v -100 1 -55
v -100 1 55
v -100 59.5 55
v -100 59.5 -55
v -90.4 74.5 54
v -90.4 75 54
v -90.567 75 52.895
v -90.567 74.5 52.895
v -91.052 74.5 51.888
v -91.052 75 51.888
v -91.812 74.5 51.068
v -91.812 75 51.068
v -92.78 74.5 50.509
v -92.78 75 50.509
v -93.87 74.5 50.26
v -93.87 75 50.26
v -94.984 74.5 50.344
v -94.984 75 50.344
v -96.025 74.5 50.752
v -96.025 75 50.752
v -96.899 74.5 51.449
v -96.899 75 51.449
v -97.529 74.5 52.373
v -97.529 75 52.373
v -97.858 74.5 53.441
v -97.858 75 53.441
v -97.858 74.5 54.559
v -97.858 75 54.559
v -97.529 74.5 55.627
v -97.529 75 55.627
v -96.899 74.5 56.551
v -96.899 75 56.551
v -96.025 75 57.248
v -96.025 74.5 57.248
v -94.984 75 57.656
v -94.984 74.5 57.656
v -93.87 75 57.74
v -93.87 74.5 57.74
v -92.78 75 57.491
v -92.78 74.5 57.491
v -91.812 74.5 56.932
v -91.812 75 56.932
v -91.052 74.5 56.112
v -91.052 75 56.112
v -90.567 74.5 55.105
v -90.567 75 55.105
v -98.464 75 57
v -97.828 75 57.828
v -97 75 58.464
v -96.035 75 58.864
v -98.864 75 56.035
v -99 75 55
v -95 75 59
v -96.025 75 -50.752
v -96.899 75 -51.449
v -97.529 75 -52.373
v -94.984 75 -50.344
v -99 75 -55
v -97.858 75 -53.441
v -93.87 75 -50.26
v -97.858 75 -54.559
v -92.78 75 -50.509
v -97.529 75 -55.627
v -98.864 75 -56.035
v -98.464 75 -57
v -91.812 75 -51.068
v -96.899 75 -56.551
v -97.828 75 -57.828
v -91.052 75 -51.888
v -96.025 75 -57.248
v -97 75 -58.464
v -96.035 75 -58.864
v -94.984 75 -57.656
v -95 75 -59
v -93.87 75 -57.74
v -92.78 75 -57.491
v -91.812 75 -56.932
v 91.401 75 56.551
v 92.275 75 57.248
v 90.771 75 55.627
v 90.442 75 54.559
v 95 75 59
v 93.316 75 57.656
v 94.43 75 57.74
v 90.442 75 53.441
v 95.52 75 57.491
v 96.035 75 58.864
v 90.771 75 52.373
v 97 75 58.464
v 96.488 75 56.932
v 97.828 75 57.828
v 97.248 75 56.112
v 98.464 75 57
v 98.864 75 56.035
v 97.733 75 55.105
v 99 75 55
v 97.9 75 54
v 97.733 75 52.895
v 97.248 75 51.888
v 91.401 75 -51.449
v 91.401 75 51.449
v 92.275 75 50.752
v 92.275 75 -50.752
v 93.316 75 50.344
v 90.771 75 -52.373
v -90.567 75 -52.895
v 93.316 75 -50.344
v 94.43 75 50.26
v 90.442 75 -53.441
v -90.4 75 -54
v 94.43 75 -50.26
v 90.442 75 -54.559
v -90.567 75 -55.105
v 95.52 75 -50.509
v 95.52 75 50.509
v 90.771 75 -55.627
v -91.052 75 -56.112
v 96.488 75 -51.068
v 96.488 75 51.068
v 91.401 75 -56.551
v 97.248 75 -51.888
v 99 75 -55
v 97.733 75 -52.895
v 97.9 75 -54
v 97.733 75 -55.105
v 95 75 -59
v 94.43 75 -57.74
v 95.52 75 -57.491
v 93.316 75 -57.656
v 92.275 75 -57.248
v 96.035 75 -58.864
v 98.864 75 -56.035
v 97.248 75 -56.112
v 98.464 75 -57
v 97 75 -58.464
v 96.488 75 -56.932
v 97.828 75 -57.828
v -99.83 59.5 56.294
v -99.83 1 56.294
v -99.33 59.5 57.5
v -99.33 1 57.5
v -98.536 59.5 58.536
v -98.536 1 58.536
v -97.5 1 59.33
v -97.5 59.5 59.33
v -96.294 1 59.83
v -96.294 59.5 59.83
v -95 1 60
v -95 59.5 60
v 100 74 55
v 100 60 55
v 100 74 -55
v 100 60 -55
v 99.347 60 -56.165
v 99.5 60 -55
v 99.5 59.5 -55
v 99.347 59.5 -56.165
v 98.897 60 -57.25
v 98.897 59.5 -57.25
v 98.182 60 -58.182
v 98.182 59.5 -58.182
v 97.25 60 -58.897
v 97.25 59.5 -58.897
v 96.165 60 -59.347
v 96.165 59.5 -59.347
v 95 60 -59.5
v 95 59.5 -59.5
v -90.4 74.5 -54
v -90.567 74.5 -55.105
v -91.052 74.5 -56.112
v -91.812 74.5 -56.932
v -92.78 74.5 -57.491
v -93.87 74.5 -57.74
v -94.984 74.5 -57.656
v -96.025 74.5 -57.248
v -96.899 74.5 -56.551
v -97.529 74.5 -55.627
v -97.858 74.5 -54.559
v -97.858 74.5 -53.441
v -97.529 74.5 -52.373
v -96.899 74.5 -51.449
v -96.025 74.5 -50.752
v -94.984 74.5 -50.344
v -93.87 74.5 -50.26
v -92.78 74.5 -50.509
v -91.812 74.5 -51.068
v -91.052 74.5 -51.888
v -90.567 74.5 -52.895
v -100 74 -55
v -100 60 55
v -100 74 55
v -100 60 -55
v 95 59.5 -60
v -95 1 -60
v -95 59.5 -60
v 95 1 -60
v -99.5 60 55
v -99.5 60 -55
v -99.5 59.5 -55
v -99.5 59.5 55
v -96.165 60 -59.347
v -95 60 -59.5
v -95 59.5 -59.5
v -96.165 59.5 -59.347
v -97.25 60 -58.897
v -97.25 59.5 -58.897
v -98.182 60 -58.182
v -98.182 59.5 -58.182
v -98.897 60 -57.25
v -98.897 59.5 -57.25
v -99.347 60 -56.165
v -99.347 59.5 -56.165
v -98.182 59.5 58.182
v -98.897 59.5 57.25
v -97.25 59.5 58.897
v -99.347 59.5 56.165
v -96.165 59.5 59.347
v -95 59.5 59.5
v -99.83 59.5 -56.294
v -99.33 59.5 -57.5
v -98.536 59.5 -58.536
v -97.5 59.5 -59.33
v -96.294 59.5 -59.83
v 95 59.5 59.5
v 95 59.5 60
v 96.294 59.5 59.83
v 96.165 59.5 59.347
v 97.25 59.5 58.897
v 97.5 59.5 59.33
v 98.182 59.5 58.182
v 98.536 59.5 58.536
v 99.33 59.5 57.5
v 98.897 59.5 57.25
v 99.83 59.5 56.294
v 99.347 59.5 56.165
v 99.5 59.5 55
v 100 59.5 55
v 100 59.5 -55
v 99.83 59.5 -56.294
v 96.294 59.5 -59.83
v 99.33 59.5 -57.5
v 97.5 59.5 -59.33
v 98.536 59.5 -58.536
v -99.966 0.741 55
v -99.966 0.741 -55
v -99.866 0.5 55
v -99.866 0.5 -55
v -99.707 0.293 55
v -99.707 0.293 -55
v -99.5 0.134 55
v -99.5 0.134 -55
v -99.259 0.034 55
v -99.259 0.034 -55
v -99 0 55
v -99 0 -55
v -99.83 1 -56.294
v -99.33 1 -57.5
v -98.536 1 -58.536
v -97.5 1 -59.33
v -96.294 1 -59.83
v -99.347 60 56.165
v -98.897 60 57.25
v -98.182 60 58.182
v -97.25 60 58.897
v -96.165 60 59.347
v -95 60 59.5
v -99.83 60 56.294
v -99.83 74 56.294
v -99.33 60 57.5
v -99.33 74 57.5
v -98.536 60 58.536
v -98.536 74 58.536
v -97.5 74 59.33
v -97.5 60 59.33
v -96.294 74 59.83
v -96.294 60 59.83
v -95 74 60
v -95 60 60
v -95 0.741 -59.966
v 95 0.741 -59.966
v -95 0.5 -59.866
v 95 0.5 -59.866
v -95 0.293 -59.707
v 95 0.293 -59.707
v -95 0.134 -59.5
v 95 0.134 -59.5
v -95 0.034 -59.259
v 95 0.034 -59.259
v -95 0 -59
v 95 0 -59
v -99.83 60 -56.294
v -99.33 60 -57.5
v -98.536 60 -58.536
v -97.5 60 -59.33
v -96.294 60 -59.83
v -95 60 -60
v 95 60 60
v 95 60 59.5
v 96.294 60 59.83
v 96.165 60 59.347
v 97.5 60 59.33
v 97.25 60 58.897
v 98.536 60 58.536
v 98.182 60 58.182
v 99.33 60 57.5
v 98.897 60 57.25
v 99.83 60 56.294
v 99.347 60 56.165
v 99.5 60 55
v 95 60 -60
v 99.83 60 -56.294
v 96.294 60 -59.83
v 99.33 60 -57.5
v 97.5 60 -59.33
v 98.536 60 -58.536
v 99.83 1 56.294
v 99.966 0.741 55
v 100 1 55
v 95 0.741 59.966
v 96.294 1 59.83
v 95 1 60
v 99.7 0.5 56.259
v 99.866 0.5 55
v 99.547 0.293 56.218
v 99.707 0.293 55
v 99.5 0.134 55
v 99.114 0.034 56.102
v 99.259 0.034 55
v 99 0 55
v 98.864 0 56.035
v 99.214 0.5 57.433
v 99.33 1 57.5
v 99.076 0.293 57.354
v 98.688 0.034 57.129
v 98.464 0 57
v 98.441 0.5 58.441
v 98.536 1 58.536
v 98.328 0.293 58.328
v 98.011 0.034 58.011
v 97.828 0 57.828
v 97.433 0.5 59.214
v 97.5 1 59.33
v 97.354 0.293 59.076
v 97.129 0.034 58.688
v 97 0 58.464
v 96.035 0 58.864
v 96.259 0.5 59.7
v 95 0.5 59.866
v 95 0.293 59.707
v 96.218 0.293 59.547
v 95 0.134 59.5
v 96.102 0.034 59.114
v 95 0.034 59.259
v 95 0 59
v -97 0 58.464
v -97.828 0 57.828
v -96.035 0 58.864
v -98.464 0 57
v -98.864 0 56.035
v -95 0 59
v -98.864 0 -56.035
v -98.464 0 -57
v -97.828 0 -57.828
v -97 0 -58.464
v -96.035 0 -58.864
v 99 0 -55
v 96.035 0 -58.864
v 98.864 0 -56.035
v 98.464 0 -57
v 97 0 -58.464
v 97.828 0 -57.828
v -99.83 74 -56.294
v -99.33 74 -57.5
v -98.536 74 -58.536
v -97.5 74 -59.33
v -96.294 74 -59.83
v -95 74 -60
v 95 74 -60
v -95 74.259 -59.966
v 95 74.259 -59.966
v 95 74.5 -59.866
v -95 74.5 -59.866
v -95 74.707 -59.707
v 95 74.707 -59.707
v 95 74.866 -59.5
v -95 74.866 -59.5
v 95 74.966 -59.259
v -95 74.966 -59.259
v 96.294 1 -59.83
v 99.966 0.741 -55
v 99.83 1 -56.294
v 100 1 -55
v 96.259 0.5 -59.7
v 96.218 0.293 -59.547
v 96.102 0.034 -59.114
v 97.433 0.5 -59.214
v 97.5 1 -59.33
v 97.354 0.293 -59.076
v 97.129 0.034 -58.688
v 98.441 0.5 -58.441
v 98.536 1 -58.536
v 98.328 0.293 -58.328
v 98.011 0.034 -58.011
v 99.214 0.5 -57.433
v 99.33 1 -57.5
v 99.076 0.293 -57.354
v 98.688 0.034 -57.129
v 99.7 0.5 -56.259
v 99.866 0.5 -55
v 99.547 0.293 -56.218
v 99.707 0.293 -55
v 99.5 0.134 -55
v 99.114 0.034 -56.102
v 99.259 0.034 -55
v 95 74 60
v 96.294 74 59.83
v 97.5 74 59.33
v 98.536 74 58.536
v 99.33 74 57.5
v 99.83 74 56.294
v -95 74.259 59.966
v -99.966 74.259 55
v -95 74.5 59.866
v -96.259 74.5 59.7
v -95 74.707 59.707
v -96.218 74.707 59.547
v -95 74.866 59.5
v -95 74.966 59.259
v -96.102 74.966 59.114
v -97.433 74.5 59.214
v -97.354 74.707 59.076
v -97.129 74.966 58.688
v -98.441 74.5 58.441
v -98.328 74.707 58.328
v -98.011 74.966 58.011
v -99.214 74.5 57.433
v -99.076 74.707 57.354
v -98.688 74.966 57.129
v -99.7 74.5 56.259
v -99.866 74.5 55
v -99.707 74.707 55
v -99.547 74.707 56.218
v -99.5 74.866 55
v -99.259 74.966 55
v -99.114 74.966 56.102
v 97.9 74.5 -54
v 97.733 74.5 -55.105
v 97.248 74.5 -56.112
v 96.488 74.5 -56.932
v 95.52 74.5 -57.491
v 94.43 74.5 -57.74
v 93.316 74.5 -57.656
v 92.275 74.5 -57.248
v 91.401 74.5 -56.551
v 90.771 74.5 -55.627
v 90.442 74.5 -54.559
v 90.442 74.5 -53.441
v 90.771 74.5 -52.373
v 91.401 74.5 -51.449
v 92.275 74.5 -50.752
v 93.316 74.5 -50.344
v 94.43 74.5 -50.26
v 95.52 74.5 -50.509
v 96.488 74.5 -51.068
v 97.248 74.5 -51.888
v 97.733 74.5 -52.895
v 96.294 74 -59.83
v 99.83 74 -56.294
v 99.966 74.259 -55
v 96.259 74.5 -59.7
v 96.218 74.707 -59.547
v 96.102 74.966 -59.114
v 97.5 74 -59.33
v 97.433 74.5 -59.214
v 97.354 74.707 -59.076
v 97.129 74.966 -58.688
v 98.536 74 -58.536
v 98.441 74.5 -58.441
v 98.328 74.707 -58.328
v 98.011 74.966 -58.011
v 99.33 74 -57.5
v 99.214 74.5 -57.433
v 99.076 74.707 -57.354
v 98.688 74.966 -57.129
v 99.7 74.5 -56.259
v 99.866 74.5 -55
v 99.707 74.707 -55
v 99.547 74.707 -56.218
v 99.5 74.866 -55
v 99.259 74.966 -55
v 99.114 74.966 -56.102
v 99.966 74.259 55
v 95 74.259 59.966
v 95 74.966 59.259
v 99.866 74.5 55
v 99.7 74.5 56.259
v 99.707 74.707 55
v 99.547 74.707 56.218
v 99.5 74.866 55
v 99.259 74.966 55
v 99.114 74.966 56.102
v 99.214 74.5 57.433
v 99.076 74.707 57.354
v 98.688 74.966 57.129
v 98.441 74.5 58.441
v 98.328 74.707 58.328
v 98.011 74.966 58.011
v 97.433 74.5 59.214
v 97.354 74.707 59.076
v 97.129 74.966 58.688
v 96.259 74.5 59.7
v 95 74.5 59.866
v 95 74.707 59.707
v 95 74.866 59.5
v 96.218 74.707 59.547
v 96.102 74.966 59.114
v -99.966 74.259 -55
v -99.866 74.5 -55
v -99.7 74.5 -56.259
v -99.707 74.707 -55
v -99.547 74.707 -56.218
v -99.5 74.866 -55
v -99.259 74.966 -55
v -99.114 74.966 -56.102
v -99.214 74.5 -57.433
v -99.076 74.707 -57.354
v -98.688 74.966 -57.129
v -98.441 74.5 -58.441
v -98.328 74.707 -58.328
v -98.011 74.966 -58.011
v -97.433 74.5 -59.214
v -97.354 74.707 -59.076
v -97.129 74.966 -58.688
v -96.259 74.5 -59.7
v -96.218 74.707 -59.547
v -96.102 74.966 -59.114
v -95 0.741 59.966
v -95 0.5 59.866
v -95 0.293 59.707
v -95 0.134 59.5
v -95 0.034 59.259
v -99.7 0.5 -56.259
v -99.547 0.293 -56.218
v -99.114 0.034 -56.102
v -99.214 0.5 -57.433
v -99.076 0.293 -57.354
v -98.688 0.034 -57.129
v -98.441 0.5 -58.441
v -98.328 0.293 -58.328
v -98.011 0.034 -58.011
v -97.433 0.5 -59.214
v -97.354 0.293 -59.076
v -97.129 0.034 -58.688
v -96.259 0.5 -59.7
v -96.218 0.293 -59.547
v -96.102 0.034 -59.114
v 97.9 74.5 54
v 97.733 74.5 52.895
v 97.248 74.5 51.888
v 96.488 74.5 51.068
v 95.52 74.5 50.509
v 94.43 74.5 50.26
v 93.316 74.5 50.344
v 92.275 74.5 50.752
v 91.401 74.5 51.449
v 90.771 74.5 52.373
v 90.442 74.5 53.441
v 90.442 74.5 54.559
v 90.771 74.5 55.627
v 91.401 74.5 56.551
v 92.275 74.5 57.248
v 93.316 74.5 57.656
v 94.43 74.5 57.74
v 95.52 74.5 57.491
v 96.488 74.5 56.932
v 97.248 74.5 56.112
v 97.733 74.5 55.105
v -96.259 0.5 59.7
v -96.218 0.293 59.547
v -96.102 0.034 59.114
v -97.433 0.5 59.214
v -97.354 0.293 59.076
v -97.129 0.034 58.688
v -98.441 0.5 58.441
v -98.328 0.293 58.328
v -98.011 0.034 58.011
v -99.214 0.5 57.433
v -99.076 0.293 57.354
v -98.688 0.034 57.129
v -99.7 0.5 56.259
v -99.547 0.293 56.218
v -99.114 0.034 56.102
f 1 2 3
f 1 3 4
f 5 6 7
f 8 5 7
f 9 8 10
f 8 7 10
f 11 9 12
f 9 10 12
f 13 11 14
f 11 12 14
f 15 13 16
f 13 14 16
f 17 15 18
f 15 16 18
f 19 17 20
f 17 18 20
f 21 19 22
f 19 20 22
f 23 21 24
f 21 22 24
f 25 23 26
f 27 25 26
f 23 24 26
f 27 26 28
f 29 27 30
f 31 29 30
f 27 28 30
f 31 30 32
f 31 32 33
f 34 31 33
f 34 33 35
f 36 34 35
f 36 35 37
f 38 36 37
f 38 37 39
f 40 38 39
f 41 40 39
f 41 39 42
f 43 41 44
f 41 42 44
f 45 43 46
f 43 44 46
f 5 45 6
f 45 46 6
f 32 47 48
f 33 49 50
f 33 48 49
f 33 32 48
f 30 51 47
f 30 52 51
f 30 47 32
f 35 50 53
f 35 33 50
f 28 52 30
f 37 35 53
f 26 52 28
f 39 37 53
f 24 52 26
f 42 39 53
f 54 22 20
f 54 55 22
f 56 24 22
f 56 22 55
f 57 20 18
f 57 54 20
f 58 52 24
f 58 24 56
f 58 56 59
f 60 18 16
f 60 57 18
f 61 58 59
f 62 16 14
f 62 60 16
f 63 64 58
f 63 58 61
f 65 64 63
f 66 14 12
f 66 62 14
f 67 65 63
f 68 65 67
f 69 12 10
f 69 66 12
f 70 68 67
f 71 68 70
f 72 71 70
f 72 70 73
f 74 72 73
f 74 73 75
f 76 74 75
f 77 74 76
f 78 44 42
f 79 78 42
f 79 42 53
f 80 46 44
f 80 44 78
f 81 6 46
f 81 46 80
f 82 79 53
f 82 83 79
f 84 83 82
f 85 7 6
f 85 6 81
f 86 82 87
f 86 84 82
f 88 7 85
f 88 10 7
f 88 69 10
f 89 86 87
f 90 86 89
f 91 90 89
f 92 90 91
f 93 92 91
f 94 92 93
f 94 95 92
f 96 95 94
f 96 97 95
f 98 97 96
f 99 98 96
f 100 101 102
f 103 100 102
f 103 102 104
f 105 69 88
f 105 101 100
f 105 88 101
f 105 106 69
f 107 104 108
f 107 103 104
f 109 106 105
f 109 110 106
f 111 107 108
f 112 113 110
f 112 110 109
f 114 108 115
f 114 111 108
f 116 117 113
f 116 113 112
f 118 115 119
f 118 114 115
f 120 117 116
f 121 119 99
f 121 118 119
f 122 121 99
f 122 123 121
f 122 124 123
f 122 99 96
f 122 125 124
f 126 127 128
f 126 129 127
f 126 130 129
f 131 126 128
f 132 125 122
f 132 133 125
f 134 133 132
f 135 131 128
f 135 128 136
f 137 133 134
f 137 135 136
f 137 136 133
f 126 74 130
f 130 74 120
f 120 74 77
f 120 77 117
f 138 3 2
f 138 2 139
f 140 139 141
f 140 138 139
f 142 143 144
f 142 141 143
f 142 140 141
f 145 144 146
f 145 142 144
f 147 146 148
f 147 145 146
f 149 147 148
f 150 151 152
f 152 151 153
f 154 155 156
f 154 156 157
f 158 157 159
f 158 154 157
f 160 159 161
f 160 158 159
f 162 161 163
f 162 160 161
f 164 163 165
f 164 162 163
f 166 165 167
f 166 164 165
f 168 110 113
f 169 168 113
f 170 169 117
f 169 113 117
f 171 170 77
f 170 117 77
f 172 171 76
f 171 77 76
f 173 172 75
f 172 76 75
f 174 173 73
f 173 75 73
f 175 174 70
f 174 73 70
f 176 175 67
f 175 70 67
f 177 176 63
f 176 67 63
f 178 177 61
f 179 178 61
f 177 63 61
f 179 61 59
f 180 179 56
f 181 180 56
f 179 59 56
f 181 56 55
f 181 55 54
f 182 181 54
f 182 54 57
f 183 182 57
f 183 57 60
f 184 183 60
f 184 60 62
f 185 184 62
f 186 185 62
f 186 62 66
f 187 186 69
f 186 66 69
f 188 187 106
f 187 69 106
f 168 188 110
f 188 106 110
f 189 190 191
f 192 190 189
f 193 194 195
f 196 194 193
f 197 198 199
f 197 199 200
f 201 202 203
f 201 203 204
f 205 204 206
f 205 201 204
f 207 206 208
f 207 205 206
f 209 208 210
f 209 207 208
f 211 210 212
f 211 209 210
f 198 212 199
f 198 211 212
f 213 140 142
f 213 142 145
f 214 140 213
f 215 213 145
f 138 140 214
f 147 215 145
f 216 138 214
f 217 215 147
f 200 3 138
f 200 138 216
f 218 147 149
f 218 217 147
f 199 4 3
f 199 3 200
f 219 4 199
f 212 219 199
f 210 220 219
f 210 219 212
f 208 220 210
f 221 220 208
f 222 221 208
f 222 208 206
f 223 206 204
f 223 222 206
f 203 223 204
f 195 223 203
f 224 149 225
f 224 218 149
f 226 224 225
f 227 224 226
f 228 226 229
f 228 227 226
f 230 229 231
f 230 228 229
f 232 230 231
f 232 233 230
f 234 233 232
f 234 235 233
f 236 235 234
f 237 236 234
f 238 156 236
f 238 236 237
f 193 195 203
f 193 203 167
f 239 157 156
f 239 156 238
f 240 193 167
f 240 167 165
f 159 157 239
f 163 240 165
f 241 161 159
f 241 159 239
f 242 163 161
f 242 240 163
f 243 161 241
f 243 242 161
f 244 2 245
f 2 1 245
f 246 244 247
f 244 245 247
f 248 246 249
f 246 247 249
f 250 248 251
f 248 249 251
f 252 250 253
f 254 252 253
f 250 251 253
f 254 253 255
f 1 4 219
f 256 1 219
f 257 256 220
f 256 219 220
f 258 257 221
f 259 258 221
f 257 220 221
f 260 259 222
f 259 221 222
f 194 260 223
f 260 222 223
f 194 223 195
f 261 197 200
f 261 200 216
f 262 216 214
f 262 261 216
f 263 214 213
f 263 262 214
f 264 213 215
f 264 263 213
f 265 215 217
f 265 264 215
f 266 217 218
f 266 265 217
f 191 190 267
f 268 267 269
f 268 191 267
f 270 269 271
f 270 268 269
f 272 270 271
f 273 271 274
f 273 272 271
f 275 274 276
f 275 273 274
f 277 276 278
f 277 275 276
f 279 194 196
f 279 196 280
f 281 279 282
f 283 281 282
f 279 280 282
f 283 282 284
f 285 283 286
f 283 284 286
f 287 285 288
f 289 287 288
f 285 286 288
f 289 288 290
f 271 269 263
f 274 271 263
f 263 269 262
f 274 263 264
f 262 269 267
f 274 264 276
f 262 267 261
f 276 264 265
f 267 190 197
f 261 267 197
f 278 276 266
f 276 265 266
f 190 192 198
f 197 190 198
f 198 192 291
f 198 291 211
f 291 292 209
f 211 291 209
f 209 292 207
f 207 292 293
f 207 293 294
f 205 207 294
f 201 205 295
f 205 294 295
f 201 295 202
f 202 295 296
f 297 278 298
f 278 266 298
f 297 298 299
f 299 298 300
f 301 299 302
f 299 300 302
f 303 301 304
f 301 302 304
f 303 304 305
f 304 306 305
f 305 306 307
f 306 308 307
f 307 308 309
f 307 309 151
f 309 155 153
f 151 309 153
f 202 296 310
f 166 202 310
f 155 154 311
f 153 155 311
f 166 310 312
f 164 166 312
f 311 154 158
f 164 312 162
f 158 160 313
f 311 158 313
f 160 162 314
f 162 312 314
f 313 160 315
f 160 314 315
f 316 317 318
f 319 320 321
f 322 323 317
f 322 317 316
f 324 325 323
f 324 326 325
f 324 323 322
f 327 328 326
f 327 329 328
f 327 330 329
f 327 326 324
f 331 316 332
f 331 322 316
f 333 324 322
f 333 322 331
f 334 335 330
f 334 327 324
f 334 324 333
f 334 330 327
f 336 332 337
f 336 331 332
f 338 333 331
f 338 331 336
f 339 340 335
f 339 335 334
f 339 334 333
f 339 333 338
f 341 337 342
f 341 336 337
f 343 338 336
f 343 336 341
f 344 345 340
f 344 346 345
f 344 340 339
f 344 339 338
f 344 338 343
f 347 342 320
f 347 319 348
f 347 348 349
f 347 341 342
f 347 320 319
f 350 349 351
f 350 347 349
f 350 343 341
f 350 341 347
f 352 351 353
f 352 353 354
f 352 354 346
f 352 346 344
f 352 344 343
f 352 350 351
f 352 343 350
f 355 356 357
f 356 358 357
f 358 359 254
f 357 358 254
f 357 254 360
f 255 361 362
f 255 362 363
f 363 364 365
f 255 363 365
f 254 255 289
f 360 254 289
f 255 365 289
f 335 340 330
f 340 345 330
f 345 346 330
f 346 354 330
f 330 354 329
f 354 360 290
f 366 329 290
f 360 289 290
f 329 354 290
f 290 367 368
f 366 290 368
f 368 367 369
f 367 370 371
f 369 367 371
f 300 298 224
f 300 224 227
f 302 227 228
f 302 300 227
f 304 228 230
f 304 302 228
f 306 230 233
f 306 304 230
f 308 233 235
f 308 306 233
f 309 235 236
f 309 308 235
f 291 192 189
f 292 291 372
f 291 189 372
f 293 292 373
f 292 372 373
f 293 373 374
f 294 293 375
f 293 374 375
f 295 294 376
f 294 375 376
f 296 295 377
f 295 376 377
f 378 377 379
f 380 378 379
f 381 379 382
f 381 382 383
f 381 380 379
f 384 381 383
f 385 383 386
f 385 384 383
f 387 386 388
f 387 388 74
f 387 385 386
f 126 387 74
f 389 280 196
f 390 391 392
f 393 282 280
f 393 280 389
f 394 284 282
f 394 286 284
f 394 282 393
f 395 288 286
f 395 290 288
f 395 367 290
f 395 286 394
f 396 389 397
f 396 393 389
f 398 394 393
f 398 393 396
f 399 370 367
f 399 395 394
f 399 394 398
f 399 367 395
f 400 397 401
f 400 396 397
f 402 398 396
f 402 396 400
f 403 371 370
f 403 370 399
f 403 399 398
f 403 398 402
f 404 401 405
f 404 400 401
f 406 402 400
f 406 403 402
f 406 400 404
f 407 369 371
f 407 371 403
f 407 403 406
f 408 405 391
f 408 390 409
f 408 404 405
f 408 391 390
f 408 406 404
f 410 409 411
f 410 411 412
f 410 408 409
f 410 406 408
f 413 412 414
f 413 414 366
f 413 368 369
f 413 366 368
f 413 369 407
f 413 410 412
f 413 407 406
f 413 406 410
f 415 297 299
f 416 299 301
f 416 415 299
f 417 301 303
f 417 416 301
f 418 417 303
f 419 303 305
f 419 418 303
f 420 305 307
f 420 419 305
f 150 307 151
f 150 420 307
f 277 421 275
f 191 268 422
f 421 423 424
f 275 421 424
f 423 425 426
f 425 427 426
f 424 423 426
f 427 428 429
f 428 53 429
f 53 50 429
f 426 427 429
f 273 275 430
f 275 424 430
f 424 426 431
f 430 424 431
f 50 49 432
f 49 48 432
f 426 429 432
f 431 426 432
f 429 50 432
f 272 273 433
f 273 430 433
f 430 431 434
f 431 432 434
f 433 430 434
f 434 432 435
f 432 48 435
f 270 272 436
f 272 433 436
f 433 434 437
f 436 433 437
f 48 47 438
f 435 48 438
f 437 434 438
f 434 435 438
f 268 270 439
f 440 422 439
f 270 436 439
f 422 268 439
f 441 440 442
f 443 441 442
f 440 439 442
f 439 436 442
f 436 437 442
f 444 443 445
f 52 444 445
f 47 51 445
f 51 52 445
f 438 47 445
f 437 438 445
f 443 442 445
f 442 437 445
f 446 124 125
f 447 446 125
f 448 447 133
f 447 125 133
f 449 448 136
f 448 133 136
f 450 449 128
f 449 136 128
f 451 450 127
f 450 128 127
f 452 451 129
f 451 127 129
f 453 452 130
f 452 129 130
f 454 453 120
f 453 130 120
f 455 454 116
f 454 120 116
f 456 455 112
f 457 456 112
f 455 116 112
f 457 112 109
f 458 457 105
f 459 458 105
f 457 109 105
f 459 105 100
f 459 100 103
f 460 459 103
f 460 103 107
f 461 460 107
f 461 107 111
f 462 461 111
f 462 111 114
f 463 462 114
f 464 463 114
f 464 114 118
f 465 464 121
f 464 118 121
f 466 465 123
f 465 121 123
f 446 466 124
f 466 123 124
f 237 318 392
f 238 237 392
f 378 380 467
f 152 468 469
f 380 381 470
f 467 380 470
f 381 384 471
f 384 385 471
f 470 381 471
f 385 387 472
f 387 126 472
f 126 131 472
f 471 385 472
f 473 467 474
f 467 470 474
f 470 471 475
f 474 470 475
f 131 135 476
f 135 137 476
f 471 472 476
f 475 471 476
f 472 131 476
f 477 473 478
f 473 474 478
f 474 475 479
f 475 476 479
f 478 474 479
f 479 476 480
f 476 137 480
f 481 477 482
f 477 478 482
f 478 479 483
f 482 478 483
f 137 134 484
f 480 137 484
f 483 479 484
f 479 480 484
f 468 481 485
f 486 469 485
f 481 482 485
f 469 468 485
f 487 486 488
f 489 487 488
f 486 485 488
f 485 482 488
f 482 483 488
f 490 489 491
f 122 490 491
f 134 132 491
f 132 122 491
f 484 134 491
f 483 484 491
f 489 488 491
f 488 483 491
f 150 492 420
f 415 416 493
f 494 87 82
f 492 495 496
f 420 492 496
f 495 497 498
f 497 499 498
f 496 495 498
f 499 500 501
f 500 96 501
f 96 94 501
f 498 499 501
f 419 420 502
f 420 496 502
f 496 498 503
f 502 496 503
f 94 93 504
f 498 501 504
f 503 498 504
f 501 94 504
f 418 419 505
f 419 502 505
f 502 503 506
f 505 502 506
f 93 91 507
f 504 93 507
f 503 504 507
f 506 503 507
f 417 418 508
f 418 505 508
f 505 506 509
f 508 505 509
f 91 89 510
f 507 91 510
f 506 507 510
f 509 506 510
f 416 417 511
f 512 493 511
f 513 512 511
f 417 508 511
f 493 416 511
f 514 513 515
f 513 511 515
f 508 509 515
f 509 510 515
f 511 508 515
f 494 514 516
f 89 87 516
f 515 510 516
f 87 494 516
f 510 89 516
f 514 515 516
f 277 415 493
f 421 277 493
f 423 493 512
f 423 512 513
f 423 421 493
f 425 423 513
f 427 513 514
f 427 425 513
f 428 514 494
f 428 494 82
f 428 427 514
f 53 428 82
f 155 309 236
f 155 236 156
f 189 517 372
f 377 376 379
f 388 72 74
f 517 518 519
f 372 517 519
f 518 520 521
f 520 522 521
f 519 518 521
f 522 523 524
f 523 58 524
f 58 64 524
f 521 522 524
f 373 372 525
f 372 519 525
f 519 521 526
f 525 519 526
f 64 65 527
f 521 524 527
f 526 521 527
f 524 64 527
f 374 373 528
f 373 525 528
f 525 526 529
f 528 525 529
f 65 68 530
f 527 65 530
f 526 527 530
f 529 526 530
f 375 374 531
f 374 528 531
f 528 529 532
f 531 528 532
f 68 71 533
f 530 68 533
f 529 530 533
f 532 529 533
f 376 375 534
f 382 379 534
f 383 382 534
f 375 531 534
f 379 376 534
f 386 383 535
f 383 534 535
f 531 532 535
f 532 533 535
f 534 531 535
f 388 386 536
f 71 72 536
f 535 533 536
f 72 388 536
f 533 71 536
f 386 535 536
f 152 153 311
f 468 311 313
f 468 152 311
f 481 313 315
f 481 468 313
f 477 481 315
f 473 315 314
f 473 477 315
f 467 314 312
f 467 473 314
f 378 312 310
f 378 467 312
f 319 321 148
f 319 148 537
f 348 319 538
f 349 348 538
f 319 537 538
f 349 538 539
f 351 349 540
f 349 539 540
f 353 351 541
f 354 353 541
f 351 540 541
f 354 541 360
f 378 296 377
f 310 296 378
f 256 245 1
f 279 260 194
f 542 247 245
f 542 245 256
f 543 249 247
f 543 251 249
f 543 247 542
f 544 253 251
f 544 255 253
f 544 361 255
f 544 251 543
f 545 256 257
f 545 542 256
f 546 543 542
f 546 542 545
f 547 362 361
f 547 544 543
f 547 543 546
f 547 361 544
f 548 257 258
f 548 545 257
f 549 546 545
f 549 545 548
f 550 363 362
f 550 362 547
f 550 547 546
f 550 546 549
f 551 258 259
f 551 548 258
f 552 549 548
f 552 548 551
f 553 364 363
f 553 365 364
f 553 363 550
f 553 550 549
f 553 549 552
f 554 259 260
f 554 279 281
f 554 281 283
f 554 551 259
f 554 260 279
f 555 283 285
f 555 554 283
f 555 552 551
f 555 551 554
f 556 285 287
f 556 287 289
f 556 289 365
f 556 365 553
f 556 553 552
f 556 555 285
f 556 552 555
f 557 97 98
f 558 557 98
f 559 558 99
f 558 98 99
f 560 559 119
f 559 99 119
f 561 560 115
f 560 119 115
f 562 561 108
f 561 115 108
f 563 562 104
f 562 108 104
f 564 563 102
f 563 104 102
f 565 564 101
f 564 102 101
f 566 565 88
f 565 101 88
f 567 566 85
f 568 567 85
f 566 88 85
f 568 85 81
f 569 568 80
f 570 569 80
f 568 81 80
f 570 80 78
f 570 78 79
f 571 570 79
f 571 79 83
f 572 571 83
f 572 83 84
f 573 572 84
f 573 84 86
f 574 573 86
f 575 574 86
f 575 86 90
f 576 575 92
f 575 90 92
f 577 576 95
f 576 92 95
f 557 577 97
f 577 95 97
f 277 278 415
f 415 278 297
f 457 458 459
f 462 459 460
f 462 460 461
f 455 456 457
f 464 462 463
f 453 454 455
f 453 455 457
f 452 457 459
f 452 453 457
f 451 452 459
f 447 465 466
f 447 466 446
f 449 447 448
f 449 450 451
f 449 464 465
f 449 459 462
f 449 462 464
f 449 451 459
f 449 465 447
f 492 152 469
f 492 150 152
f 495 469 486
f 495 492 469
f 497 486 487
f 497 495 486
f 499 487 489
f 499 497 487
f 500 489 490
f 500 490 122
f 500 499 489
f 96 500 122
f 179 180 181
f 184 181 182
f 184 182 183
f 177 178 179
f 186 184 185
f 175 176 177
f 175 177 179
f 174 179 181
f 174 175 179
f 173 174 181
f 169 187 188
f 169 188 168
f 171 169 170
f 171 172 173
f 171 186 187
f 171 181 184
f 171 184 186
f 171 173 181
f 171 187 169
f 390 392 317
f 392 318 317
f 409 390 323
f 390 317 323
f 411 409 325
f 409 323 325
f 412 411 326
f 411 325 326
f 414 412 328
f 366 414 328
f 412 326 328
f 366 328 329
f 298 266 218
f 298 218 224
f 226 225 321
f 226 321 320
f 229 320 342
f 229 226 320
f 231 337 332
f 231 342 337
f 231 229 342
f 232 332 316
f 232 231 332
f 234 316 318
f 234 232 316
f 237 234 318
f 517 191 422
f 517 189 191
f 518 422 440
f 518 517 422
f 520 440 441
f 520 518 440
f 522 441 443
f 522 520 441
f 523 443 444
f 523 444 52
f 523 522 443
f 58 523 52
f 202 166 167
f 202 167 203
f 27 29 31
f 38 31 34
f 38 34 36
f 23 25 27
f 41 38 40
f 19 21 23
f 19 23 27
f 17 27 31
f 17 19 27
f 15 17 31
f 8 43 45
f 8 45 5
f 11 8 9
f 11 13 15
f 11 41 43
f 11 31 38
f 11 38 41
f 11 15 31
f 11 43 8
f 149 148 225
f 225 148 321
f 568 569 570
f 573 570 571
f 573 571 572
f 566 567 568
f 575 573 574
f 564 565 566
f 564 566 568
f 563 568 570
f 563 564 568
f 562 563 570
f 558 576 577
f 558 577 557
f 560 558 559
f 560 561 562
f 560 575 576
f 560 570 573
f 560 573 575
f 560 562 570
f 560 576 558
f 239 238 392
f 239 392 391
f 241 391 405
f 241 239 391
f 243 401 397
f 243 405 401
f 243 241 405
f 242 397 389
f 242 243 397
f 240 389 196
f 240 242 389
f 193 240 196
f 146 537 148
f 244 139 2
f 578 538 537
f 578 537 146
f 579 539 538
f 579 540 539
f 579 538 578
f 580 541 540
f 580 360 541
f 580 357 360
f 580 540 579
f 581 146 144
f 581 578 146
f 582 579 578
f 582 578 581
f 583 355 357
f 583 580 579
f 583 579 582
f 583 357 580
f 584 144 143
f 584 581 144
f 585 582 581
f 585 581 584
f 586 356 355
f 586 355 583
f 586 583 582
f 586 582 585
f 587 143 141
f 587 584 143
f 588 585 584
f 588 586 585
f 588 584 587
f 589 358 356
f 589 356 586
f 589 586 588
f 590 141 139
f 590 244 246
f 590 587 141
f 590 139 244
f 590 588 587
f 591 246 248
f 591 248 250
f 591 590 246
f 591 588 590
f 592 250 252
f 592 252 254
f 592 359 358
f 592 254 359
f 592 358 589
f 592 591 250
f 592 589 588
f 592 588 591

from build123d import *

# Parameters (mm, degrees)
SKETCH1_W           = 200
SKETCH1_H           = 120
BOSS_EXTRUDE1_DEPTH = 75
FILLET1_R           = 5
CUT_EXTRUDE2_DEPTH  = 0.5
SKETCH4_R           = 3.75
CUT_EXTRUDE3_DEPTH  = 0.5
FILLET2_R           = 1


with BuildPart() as part:
    # Sketch1 → Boss-Extrude1 (new body)
    with BuildSketch(Plane(origin=(0, 0, 0), x_dir=(1, 0, 0), z_dir=(0, 1, 0))):
        Rectangle(SKETCH1_W, SKETCH1_H)
    extrude(amount=BOSS_EXTRUDE1_DEPTH)

    # Fillet1
    fillet1_edges = [part.edges().sort_by_distance(p)[0] for p in [
        (-100, 37.5, -60),
        (100, 37.5, -60),
        (100, 37.5, 60),
        (-100, 37.5, 60),
    ]]
    fillet(fillet1_edges, radius=FILLET1_R)

    # Sketch3 → Cut-Extrude2 (cut)
    with BuildSketch(Plane(origin=(0, 60, 0), x_dir=(1, 0, 0), z_dir=(0, 1, 0))):
        with BuildLine():
            Line((95, 60), (-95, 60))
            ThreePointArc((-95, 60), (-98.535533906, 58.535533906), (-100, 55))
            Line((-100, 55), (-100, -55))
            ThreePointArc((-100, -55), (-98.535533906, -58.535533906), (-95, -60))
            Line((-95, -60), (95, -60))
            ThreePointArc((95, -60), (98.535533906, -58.535533906), (100, -55))
            Line((100, -55), (100, 55))
            ThreePointArc((100, 55), (98.535533906, 58.535533906), (95, 60))
        make_face()
        with BuildLine():
            Line((95, 59.5), (-95, 59.5))
            ThreePointArc((-95, 59.5), (-98.181980515, 58.181980515), (-99.5, 55))
            Line((-99.5, 55), (-99.5, -55))
            ThreePointArc((-99.5, -55), (-98.181980515, -58.181980515), (-95, -59.5))
            Line((-95, -59.5), (95, -59.5))
            ThreePointArc((95, -59.5), (98.181980515, -58.181980515), (99.5, -55))
            Line((99.5, -55), (99.5, 55))
            ThreePointArc((99.5, 55), (98.181980515, 58.181980515), (95, 59.5))
        make_face(mode=Mode.SUBTRACT)
    extrude(amount=-CUT_EXTRUDE2_DEPTH, mode=Mode.SUBTRACT)

    # Sketch4 → Cut-Extrude3 (cut)
    with BuildSketch(Plane(origin=(0, 75, 0), x_dir=(1, 0, 0), z_dir=(0, 1, 0))):
        with Locations((-94.15, 54)):
            Circle(SKETCH4_R)
        with Locations((94.15, 54)):
            Circle(SKETCH4_R)
        with Locations((94.15, -54)):
            Circle(SKETCH4_R)
        with Locations((-94.15, -54)):
            Circle(SKETCH4_R)
    extrude(amount=-CUT_EXTRUDE3_DEPTH, mode=Mode.SUBTRACT)

    # Fillet2
    fillet2_edges = [part.edges().sort_by_distance(p)[0] for p in [
        (-100, 0, 0),
        (-100, 75, 0),
        (0, 0, -60),
        (100, 0, 0),
        (0, 0, 60),
        (-98.535533906, 0, 58.535533906),
        (98.535533906, 0, 58.535533906),
        (98.535533906, 0, -58.535533906),
        (-98.535533906, 0, -58.535533906),
        (0, 75, -60),
        (0, 75, 60),
        (100, 75, 0),
        (-98.535533906, 75, 58.535533906),
        (98.535533906, 75, 58.535533906),
        (98.535533906, 75, -58.535533906),
        (-98.535533906, 75, -58.535533906),
    ]]
    fillet(fillet2_edges, radius=FILLET2_R)


solid = part.part
